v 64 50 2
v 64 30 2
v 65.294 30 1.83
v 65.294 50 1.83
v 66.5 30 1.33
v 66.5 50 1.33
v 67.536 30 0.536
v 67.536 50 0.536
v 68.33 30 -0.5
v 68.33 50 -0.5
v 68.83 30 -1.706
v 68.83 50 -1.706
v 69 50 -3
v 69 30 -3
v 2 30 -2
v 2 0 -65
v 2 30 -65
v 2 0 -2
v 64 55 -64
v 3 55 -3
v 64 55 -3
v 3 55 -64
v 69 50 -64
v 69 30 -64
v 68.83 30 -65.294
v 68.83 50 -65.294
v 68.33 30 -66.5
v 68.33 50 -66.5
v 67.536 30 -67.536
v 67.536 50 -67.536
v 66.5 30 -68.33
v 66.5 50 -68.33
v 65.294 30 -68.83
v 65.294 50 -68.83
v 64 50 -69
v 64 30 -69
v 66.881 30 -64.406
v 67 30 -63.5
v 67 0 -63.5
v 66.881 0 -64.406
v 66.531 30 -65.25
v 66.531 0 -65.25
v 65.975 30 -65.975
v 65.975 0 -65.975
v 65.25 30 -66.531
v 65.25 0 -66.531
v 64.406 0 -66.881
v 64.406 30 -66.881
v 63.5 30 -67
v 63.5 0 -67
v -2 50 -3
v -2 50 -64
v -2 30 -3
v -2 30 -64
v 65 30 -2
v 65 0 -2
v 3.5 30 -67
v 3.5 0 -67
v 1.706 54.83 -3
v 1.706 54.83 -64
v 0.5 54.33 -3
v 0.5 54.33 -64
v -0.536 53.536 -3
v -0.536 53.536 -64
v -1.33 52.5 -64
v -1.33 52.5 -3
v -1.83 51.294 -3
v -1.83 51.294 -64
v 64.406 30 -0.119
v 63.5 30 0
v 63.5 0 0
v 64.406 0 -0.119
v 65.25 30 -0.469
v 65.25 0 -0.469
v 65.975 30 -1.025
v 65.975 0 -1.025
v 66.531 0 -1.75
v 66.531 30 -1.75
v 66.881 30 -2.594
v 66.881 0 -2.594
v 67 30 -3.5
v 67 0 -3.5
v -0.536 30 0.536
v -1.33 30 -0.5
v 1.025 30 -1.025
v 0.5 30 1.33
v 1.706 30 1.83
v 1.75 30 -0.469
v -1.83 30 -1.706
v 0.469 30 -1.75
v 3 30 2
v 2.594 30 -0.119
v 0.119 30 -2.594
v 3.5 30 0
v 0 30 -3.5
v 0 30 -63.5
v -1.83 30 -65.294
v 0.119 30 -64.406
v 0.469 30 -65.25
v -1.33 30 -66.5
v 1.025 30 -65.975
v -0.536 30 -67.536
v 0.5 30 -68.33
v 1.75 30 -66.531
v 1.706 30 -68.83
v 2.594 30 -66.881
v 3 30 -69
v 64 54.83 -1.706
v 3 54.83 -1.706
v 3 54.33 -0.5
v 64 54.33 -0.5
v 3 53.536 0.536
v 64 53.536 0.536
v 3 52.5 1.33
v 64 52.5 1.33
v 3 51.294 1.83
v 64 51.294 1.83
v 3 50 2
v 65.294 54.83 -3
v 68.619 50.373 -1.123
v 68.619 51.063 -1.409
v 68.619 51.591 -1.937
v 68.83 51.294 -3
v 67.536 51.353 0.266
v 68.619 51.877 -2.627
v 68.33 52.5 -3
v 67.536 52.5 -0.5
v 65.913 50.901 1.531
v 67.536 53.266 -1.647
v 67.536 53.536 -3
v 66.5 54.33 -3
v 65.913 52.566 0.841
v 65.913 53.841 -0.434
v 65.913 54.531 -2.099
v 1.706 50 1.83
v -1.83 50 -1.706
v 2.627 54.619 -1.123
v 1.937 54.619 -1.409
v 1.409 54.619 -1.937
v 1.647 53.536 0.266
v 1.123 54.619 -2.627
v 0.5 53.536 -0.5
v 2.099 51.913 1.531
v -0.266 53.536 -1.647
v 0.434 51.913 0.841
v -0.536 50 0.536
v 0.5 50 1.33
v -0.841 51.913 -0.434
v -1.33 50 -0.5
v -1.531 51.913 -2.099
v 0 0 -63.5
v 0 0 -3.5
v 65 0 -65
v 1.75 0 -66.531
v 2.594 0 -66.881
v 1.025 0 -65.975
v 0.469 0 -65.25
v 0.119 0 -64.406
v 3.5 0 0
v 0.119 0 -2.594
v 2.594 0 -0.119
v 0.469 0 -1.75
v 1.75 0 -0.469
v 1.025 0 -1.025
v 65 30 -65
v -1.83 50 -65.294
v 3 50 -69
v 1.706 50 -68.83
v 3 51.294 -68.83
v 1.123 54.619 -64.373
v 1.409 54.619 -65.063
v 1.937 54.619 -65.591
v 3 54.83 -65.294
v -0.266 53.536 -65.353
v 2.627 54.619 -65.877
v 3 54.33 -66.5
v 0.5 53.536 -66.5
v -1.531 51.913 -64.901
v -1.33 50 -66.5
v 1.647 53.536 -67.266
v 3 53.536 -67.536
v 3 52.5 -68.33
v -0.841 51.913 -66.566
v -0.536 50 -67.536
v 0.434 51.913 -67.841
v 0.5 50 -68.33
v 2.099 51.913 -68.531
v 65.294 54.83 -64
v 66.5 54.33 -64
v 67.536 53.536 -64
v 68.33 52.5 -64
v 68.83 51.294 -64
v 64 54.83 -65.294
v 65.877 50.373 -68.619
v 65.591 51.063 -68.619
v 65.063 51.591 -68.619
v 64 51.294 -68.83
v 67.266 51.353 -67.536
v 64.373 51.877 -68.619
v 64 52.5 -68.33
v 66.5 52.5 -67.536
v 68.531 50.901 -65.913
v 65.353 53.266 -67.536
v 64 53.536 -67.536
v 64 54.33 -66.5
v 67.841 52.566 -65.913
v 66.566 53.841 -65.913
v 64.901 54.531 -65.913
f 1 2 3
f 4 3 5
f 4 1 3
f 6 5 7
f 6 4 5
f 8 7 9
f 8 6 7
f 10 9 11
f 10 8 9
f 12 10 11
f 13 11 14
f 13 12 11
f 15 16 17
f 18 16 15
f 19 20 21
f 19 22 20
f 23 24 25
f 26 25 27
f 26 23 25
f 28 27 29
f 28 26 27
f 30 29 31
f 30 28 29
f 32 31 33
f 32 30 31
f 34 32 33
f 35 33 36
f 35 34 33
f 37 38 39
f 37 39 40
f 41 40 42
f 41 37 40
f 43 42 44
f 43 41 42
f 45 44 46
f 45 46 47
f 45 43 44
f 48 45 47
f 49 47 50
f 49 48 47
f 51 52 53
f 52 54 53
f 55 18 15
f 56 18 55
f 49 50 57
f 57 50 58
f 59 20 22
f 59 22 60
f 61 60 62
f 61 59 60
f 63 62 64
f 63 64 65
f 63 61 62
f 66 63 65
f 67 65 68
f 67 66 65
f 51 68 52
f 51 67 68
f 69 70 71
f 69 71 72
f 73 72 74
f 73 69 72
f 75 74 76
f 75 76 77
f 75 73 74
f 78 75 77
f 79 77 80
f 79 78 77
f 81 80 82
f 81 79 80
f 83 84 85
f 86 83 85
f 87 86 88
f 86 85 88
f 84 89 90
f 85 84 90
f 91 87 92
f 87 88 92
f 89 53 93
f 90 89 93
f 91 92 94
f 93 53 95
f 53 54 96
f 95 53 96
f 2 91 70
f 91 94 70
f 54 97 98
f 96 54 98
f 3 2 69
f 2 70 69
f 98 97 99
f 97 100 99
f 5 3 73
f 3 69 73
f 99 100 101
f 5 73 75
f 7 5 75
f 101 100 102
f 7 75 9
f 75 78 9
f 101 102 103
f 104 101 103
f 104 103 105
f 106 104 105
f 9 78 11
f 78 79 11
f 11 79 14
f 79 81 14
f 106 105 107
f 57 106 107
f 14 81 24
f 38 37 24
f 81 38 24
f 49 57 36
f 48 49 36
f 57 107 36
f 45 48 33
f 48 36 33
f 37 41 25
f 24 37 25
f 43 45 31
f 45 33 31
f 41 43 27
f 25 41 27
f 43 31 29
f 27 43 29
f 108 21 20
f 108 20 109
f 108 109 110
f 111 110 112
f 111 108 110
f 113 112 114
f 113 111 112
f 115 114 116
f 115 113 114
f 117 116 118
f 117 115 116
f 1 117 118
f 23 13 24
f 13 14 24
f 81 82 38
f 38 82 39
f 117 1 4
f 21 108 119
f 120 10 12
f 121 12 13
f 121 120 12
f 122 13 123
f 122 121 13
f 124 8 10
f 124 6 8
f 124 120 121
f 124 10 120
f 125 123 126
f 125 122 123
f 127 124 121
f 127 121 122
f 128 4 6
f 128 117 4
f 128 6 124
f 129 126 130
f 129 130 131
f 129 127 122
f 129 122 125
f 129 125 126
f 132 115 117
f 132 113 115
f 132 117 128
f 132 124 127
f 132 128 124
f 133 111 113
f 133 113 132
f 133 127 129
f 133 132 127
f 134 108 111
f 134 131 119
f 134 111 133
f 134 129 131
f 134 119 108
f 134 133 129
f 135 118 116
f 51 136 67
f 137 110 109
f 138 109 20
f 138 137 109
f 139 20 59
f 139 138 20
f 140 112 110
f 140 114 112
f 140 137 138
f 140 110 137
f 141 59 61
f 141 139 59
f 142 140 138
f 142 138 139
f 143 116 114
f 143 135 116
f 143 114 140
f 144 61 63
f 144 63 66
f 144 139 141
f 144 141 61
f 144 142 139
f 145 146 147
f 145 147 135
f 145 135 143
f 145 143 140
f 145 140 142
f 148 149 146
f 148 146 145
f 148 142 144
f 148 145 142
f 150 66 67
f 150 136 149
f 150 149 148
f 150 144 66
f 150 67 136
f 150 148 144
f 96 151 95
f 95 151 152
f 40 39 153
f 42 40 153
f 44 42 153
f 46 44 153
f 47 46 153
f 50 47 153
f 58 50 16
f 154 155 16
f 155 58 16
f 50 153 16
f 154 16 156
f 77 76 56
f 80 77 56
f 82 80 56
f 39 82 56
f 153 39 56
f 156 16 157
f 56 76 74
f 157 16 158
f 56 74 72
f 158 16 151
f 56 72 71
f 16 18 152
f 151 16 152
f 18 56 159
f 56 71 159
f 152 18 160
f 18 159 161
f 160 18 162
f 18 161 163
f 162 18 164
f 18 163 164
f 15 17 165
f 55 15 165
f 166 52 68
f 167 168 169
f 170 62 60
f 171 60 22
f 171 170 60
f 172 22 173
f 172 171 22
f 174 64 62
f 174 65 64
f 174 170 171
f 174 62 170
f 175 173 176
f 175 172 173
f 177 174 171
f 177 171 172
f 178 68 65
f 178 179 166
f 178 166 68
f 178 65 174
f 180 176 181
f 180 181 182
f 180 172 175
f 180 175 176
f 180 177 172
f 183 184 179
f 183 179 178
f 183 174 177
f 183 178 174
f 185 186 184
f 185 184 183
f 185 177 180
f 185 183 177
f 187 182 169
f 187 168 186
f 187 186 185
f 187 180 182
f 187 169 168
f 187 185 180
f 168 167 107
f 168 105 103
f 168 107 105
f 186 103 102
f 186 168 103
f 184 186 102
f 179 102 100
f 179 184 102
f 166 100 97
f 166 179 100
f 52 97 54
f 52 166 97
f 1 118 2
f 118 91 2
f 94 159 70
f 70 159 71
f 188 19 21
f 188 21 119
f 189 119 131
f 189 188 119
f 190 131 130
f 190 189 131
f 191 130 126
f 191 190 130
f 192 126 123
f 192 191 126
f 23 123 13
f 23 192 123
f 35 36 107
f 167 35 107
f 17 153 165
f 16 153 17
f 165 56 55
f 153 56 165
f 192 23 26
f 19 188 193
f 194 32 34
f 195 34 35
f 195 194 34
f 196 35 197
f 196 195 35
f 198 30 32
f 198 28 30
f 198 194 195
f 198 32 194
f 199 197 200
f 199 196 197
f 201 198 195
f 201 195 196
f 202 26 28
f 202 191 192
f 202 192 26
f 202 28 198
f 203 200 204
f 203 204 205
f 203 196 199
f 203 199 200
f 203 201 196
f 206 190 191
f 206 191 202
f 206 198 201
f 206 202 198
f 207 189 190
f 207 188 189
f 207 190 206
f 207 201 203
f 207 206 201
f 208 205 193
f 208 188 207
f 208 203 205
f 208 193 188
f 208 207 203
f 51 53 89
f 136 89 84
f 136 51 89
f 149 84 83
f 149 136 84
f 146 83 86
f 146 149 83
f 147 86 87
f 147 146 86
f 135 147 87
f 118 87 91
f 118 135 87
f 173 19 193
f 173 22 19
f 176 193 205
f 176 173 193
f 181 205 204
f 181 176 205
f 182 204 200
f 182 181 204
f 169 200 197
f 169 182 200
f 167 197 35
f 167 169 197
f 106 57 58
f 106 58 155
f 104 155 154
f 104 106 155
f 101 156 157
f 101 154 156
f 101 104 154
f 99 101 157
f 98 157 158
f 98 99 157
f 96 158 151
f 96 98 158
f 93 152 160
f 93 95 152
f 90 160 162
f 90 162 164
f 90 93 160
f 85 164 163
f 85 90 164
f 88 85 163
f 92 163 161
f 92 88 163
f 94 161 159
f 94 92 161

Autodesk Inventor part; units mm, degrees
ref_plane "YZ Plane" through (0, 0, 0) normal (1, 0, 0) x (0, 1, 0)
ref_plane "XZ Plane" through (0, 0, 0) normal (0, 1, 0) x (-1, 0, 0)
ref_plane "XY Plane" through (0, 0, 0) normal (0, 0, 1) x (1, 0, 0)
sketch "草图1" plane through (0, 0, 0) normal (0, 1, 0) x (-1, 0, 0)
  line L0 (0, 0) -> (-67, 0)
  line L1 (-67, 0) -> (-67, -67)
  line L2 (-67, -67) -> (0, -67)
  line L3 (0, -67) -> (0, 0)
  line L4 (-2, -2) -> (-65, -2)
  line L5 (-65, -2) -> (-65, -65)
  line L6 (-65, -65) -> (-2, -65)
  line L7 (-2, -65) -> (-2, -2)
  dimension "d0" = 67
  dimension "d1" = 67
  dimension "d2" = 2
extrude "拉伸1" add sketch "草图1" along normal blind 30
sketch "草图2" plane through (0, 30, 0) normal (0, 1, 0) x (1, 0, 0)
  line L0 (67, 67) -> (0, 67) projected
  line L1 (0, 0) -> (67, 0)
  line L2 (67, 0) -> (67, 67)
  line L3 (67, 67) -> (0, 67)
  line L4 (0, 67) -> (0, 0)
  line L5 (-2, -2) -> (69, -2)
  line L6 (69, -2) -> (69, 69)
  line L7 (69, 69) -> (-2, 69)
  line L8 (-2, 69) -> (-2, -2)
  dimension "d5" = 2
extrude "拉伸2" add sketch "草图2" along normal blind 25 contours L2 L1 L4 L0 | L8 L7 L6 L5
fillet "圆角1" radius 3.5 4 edges at (67, 15, 0) (67, 15, -67) (0, 15, 0) (0, 15, -67)
fillet "圆角2" radius 5 8 edges at (-2, 42.5, 2) (-2, 42.5, -69) (-2, 55, -33.5) (33.5, 55, 2) (69, 42.5, 2) (69, 55, -33.5) (69, 42.5, -69) (33.5, 55, -69)
properties part number "顶盖"
